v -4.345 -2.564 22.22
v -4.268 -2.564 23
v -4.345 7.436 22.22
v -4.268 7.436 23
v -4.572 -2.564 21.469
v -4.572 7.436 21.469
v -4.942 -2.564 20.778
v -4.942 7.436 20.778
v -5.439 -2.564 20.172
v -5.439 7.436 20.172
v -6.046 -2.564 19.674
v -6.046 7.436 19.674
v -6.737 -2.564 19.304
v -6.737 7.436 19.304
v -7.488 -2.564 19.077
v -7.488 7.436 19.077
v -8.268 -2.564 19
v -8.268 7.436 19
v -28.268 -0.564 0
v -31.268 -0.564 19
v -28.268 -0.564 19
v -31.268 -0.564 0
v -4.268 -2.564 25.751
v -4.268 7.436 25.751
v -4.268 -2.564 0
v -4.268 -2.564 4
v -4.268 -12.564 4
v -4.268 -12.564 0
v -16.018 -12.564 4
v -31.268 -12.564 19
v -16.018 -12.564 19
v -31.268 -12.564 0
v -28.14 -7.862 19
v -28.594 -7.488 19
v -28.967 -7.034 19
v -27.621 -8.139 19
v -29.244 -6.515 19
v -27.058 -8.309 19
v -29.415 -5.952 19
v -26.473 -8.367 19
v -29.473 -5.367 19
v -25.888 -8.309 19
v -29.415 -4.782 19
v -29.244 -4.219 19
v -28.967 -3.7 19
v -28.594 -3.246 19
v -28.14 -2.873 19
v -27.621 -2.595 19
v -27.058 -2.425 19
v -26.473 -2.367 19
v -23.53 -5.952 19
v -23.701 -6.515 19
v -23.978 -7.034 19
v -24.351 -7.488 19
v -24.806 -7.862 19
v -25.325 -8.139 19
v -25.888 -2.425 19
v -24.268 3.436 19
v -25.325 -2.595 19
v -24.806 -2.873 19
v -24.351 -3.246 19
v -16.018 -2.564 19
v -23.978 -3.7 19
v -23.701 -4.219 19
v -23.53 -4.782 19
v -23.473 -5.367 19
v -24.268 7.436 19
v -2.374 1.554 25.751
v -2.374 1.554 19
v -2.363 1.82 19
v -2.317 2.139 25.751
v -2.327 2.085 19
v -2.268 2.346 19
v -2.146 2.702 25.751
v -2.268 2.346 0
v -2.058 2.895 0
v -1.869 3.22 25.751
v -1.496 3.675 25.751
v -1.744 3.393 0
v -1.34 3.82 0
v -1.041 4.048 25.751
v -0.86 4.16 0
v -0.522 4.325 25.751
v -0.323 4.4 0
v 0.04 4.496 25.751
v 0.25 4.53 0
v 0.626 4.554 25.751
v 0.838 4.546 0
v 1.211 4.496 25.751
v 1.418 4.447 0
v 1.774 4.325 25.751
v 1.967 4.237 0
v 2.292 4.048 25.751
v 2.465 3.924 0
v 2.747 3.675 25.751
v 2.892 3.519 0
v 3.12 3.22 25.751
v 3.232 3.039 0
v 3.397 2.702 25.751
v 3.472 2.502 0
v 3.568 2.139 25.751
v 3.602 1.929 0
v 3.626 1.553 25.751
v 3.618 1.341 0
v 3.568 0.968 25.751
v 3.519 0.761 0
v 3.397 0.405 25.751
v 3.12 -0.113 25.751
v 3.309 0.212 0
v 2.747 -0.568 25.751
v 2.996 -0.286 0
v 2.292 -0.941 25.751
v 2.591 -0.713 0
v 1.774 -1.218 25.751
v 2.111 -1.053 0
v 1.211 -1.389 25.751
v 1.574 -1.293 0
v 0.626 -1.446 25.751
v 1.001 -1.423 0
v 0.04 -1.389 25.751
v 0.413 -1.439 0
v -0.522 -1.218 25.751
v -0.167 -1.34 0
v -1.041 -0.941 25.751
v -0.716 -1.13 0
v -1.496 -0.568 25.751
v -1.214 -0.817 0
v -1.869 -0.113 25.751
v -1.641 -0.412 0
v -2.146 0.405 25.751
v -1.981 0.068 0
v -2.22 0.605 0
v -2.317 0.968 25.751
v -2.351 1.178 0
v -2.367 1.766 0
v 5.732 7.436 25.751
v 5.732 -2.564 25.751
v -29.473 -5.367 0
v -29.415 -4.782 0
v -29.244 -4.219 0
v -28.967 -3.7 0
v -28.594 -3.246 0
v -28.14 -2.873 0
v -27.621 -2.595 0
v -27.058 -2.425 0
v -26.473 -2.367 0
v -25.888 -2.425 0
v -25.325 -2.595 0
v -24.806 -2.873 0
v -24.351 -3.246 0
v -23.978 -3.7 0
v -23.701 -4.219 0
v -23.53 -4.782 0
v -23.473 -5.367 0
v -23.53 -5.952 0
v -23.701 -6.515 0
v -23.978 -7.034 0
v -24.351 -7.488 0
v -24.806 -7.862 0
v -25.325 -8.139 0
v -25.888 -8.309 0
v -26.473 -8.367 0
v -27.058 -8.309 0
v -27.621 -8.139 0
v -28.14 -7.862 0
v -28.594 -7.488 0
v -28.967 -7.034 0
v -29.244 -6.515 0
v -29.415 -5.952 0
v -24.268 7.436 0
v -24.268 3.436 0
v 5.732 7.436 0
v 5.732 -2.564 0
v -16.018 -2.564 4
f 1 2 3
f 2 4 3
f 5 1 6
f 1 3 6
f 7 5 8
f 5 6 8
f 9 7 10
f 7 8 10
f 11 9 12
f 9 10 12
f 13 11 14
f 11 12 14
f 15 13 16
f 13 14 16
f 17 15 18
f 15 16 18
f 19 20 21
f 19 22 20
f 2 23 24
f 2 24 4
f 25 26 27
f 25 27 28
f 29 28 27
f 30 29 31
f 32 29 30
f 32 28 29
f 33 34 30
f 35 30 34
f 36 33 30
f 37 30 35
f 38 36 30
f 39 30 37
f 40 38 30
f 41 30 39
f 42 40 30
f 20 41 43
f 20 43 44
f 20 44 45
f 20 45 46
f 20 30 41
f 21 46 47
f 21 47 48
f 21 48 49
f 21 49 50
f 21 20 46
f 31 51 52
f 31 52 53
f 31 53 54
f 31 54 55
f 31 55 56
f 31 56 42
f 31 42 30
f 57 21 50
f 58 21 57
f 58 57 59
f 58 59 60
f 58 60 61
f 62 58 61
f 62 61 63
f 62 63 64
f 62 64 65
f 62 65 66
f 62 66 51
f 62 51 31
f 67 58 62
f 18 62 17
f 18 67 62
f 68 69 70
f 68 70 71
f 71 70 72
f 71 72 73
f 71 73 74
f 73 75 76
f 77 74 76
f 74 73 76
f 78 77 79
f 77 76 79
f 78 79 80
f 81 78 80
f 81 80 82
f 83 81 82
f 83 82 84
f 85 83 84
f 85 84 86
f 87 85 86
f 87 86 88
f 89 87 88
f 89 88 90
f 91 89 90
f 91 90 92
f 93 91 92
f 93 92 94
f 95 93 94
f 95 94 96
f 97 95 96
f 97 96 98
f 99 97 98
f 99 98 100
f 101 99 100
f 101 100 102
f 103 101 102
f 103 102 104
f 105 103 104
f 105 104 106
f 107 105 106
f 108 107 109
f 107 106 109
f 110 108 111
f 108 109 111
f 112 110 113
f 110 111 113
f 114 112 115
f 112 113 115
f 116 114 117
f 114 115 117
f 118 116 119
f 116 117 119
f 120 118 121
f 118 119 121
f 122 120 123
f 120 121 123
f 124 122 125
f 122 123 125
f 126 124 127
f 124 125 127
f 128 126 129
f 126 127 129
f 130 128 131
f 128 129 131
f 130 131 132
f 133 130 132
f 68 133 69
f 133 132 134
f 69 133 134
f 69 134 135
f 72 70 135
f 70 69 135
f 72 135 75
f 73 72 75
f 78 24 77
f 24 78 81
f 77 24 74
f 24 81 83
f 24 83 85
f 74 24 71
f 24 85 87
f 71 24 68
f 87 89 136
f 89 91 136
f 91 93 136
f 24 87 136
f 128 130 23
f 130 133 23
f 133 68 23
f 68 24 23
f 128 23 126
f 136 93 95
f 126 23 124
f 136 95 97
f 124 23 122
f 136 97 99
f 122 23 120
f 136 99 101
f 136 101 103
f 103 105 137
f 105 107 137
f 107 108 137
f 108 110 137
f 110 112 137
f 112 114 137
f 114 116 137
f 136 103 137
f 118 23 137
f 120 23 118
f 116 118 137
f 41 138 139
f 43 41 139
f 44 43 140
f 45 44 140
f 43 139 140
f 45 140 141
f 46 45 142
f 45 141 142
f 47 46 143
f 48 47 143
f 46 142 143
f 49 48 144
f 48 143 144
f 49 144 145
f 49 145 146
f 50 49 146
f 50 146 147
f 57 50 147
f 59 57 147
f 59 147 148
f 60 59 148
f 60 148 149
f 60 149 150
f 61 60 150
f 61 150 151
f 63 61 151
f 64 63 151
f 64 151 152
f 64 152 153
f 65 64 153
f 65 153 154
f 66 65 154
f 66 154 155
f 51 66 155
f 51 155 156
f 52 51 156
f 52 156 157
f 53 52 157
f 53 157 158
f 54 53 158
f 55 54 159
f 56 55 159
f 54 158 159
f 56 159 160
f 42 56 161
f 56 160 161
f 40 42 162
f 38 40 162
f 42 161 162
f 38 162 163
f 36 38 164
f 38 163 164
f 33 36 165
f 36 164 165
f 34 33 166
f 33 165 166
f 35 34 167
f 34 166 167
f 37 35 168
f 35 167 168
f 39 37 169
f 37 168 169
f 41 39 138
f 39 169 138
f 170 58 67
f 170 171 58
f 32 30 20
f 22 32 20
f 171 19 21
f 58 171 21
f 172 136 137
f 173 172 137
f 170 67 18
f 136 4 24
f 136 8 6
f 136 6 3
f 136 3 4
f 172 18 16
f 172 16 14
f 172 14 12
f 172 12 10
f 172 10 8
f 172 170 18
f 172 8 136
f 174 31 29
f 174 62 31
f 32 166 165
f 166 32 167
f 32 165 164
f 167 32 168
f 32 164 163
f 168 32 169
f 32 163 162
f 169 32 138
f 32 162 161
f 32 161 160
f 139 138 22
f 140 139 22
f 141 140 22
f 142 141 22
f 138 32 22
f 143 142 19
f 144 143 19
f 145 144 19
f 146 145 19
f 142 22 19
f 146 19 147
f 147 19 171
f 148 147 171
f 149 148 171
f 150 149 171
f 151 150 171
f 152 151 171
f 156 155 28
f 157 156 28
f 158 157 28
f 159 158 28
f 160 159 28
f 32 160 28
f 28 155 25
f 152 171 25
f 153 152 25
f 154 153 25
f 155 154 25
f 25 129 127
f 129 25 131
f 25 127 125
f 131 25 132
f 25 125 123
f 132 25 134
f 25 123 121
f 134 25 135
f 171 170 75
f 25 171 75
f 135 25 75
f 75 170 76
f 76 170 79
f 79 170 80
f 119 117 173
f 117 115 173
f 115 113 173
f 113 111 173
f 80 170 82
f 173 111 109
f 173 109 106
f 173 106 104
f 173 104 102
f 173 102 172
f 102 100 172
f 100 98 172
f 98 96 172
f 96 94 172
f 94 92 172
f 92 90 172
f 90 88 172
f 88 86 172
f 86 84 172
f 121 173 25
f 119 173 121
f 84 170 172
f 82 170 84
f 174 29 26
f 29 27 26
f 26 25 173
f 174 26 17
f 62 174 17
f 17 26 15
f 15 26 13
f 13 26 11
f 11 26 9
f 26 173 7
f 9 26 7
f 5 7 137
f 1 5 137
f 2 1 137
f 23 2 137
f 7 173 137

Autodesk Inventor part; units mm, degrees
ref_plane "YZ Plane" through (0, 0, 0) normal (1, 0, 0) x (0, 1, 0)
ref_plane "XZ Plane" through (0, 0, 0) normal (0, 1, 0) x (-1, 0, 0)
ref_plane "XY Plane" through (0, 0, 0) normal (0, 0, 1) x (1, 0, 0)
sketch "草图1" plane through (0, 0, 0) normal (0, 0, 1) x (1, 0, 0)
  line L0 (-22.2679, -12.5636) -> (3.7321, -12.5636) projected
  line L1 (-24.2679, 7.4364) -> (5.7321, 7.4364)
  line L2 (5.7321, 7.4364) -> (5.7321, -12.5636)
  line L3 (5.7321, -12.5636) -> (-24.2679, -12.5636)
  line L4 (-24.2679, -12.5636) -> (-24.2679, 7.4364)
  point P0 (-22.2679, -12.5636)
  point P1 (3.7321, -12.5636)
  dimension "d4" = 30
  dimension "d5" = 20
extrude "拉伸1" add sketch "草图1" along normal blind 19
sketch "草图2" plane through (0, 0, 0) normal (0, 0, -1) x (-1, 0, 0)
  line L0 (24.2679, 7.4364) -> (24.2679, -12.5636) projected
  line L1 (24.2679, -12.5636) -> (31.2679, -12.5636)
  line L2 (31.2679, -12.5636) -> (31.2679, -0.5636)
  line L3 (31.2679, -0.5636) -> (24.2679, -0.5636)
  line L4 (24.2679, -0.5636) -> (24.2679, -12.5636)
  point P0 (0, 0)
  dimension "d6" = 7
  dimension "d7" = 12
extrude "拉伸2" add sketch "草图2" against normal up to surface (19 mm away)
sketch "草图3" plane through (0, 0, 0) normal (0, 0, -1) x (-1, 0, 0)
  circle A0 centre (-0.6256, 1.5535) radius 3
  circle A1 centre (26.4728, -5.3671) radius 3
  point P0 (0, 0)
  dimension "d10" = 6
  dimension "d11" = 6
extrude "拉伸3" cut sketch "草图3" against normal blind 40
sketch "草图4" plane through (5.7321, -12.5636, 0) normal (1, 0, 0) x (0, 0, -1)
  line L0 (-19, 0) -> (-4, 0)
  line L1 (-4, 0) -> (-4, 10)
  line L2 (-4, 10) -> (-19, 10)
  line L3 (-19, 10) -> (-19, 0)
  point P0 (0, 12.5636)
  dimension "d14" = 10
  dimension "d15" = 15
extrude "拉伸4" cut sketch "草图4" against normal blind 21.75
chamfer "倒角1" distance 4 angle 45 1 edges at (-24.2679, -0.5636, 9.5)
sketch "草图5" plane through (5.7321, -12.5636, 0) normal (1, 0, 0) x (0, 0, -1)
  line L0 (-4, 0) -> (-19, 0) projected
  line L1 (-4, 0) -> (0, 0)
  line L2 (0, 0) -> (0, 10)
  line L3 (0, 10) -> (-4, 10)
  line L4 (-4, 10) -> (-4, 0)
  line L5 (0, 0) -> (0, 20) projected
  line L6 (-19, 10) -> (-4, 10) projected
  point P0 (0, 12.5636)
extrude "拉伸5" cut sketch "草图5" against normal blind 10
sketch "草图6" plane through (5.7321, -2.5636, 0) normal (0, -1, 0) x (1, 0, 0)
  line L0 (0, 0) -> (0, 19) projected
  line L1 (0, 0) -> (-8, 0)
  line L2 (-8, 0) -> (-8, 25.7509)
  line L3 (-8, 25.7509) -> (0, 25.7509)
  line L4 (0, 25.7509) -> (0, 0)
  line L5 (-12.3, 25.7509) -> (0, 25.7509) projected
  line L6 (-21.75, 19) -> (0, 19) projected
  line L7 (-8, 25.7509) -> (-10, 25.7509)
  line L8 (-10, 25.7509) -> (-10, 19)
  line L9 (-10, 19) -> (-8, 19)
  line L10 (-8, 19) -> (-8, 25.7509)
  point P0 (-5.7321, 0)
  point P1 (-8, 19)
  dimension "d23" = 8
  dimension "d28" = 10
extrude "拉伸6" add sketch "草图6" against normal up to surface (10 mm away)
sketch "草图8" plane through (0, 0, 0) normal (0, 0, -1) x (-1, 0, 0)
  circle A0 centre (-0.6256, 1.5535) radius 3
  point P0 (0, 0)
extrude "拉伸7" cut sketch "草图8" against normal blind 42.75
fillet "圆角1" radius 4 1 edges at (-4.2679, 2.4364, 19)
properties part number "固定传动"
